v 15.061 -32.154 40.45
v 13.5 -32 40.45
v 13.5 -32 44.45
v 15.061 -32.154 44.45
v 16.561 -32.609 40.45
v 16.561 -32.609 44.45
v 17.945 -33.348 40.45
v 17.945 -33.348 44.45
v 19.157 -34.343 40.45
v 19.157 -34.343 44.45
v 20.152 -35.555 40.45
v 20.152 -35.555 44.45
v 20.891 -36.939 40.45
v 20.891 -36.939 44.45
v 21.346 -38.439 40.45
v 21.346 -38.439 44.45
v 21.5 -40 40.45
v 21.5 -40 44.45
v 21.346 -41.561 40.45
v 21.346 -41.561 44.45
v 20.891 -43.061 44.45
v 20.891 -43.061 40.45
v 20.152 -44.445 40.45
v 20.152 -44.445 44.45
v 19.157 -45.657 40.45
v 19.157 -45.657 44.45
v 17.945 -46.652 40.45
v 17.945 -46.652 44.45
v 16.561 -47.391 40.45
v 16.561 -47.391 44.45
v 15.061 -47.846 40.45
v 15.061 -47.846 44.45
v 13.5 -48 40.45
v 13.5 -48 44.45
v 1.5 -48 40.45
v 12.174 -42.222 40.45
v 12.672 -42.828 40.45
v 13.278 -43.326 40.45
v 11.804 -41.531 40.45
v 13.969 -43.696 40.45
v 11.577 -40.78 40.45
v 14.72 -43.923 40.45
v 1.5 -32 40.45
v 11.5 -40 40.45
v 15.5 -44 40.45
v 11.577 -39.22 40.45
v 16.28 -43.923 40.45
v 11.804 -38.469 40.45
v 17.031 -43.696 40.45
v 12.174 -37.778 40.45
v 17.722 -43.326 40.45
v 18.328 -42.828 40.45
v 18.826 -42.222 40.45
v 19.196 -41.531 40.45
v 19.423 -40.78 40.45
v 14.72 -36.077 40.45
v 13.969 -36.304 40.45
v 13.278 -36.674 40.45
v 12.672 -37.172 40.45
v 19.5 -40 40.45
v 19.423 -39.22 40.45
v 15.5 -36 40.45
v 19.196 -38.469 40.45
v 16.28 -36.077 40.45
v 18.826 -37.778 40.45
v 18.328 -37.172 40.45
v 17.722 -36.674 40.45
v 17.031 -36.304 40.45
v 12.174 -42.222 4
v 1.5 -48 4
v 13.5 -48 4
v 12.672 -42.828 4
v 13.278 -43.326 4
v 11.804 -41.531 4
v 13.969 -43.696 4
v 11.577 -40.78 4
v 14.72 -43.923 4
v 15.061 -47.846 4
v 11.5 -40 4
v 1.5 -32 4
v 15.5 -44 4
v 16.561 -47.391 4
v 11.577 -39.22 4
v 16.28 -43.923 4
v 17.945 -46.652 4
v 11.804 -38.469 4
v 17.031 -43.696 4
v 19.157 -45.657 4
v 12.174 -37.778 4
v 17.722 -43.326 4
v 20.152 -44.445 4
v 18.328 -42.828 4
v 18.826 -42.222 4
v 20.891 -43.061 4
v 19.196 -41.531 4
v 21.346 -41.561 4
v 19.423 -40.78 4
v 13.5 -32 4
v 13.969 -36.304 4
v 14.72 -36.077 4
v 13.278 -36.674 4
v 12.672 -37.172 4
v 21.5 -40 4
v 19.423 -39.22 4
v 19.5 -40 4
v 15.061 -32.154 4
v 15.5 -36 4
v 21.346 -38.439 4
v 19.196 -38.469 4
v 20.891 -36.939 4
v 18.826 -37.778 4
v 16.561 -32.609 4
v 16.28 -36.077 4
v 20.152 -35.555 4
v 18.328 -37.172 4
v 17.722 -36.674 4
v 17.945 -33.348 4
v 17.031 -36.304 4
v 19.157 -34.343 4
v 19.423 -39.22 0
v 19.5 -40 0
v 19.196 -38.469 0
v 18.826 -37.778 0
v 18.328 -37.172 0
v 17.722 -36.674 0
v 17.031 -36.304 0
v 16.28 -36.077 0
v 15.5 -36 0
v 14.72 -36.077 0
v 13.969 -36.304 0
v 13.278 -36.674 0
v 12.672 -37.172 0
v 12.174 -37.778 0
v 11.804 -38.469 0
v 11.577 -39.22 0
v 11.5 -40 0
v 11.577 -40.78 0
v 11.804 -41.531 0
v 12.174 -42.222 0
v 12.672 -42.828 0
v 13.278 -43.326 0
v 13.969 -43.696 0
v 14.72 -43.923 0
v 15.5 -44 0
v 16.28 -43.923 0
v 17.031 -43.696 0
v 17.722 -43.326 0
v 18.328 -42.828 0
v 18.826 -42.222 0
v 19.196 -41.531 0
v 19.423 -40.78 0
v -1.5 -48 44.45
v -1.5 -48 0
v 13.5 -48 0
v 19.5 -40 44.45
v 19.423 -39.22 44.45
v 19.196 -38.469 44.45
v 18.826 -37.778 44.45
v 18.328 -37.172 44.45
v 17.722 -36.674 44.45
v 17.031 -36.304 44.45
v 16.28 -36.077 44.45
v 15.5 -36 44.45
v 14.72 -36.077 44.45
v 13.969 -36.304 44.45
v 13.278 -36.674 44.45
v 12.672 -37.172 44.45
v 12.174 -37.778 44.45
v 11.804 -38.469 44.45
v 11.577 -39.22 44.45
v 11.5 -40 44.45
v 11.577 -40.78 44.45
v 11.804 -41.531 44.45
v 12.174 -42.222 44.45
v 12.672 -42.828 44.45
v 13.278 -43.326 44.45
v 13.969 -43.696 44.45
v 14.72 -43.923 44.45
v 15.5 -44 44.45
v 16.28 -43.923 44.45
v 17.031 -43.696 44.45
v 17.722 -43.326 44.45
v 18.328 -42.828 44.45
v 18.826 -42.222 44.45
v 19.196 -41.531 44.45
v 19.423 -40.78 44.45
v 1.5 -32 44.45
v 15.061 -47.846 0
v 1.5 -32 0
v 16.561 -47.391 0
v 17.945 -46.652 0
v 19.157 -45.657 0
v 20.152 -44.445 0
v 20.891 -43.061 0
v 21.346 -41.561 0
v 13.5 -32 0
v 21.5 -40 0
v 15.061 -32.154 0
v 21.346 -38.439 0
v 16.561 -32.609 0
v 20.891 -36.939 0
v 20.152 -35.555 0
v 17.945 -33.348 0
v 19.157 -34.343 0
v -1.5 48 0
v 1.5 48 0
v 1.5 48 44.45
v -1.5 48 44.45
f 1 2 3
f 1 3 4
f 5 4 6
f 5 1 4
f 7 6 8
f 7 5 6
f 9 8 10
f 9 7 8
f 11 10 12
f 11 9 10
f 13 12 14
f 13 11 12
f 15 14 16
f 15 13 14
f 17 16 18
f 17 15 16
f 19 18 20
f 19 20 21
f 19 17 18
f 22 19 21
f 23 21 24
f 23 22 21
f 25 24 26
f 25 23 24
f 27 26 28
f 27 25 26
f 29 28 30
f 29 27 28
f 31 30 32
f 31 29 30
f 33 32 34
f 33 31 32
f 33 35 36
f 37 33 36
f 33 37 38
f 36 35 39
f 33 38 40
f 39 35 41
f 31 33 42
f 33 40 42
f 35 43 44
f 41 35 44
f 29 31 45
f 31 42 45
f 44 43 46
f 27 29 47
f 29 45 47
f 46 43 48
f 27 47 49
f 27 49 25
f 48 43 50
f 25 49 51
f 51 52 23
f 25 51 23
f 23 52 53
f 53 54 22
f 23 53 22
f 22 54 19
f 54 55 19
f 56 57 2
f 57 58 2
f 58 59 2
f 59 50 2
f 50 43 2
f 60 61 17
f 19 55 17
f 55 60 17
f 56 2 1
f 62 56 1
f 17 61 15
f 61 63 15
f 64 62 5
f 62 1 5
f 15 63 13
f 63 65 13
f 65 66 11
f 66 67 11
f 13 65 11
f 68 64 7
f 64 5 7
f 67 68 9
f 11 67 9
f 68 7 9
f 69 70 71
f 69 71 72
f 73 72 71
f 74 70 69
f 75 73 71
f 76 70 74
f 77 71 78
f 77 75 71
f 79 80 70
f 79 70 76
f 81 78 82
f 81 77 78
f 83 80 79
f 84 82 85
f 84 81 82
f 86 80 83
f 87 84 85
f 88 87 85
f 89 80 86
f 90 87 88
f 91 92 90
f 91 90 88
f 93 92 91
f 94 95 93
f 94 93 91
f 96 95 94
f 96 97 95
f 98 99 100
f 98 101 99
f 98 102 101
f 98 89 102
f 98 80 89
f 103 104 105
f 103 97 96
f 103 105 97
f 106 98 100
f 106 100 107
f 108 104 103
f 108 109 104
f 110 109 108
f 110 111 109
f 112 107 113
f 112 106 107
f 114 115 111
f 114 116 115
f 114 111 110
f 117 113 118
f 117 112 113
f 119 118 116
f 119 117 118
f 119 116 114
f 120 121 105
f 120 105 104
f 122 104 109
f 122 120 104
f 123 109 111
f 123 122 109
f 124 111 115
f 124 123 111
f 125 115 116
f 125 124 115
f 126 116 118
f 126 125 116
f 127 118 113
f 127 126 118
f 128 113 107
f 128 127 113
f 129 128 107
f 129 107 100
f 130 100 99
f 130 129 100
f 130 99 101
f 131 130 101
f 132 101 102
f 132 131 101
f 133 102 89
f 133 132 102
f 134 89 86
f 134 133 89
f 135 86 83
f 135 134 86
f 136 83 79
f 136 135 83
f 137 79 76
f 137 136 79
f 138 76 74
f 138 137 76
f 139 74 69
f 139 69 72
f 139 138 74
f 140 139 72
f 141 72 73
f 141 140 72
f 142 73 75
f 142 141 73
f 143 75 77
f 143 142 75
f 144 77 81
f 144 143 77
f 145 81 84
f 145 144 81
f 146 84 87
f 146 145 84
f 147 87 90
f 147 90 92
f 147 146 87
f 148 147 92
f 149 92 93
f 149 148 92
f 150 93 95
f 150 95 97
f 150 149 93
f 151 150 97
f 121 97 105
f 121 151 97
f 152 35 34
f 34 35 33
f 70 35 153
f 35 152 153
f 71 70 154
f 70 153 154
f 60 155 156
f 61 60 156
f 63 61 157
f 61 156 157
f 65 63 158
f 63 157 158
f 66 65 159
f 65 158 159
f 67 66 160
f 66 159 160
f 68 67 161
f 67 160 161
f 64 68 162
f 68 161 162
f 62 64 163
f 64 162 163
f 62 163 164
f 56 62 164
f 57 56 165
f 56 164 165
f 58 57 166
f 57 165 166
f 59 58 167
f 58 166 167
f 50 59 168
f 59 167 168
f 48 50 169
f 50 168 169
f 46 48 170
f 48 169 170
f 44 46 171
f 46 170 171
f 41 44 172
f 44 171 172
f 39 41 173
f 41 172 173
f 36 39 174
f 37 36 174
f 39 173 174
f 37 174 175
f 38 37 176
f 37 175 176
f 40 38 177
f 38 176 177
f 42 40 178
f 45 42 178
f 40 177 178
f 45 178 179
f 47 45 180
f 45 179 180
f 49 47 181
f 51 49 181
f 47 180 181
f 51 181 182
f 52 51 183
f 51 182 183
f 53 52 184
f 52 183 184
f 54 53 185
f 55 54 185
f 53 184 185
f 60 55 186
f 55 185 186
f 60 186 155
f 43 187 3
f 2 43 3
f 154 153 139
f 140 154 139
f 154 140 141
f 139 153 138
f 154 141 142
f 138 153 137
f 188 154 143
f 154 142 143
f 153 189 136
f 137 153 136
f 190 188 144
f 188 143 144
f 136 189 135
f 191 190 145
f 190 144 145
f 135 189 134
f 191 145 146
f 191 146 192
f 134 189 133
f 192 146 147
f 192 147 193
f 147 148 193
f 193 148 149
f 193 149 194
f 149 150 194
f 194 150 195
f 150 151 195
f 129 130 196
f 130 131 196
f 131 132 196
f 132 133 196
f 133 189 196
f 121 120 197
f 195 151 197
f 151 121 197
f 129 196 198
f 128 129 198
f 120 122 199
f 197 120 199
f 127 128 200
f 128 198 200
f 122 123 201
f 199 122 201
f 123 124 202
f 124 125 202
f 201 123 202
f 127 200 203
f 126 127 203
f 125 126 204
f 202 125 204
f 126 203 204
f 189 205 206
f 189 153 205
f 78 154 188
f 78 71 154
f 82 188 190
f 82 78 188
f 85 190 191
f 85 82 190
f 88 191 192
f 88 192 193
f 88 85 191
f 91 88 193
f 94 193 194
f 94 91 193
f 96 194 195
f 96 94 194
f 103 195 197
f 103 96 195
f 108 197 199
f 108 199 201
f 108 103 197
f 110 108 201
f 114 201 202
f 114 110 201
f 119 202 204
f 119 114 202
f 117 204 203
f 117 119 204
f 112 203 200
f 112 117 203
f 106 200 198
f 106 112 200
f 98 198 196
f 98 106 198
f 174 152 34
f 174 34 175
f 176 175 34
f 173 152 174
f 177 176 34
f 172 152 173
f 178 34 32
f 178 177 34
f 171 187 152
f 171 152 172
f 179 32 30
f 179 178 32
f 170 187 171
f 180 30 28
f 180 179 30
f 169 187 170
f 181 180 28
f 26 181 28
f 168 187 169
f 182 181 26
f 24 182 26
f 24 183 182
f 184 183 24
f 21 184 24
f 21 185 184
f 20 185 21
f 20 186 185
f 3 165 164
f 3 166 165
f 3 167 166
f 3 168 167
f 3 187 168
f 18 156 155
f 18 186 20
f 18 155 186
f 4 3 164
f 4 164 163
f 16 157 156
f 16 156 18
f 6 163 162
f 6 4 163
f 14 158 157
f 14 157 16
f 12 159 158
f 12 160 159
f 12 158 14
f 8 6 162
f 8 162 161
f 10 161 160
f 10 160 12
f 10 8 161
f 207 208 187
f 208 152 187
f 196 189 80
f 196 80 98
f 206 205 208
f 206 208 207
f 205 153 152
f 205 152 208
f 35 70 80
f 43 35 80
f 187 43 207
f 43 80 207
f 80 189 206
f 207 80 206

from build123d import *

# Parameters (mm, degrees)
SKETCH1_W                   = 3
SKETCH1_H                   = 96
BOSS_EXTRUDE1_DEPTH         = 44.45
SKETCH2_W                   = 20
SKETCH2_H                   = 16
SKETCH2_R                   = 4
BOSS_EXTRUDE2_DEPTH         = 4
FILLET2_RADIUS              = 8
FILLET2_LENGTH              = 4
FILLET2_OF_MIRROR2_2_RADIUS = 8
FILLET2_OF_MIRROR2_2_LENGTH = 4


with BuildPart() as part:
    # Sketch1 → Boss-Extrude1 (new body)
    with BuildSketch(Plane.XY):
        Rectangle(SKETCH1_W, SKETCH1_H)
    extrude(amount=BOSS_EXTRUDE1_DEPTH)

    # Sketch2 → Boss-Extrude2 (add)
    with BuildSketch(Plane.XY.offset(44.45)):
        with Locations((11.5, -40)):
            Rectangle(SKETCH2_W, SKETCH2_H)
        with Locations((15.5, -40)):
            Circle(SKETCH2_R, mode=Mode.SUBTRACT)
    boss_extrude2 = extrude(amount=-BOSS_EXTRUDE2_DEPTH)

    # Fillet2: full round fillet: the end face becomes a half cylinder, R = half its width
    fillet2_face = Plane((21.5, -40, 42.45), x_dir=(0, 0, -1), z_dir=(1, 0, 0))  # on the end face: x along it, z out of the body
    fillet2_slab = fillet2_face.offset(-FILLET2_RADIUS / 2) * Box(FILLET2_LENGTH, 2 * FILLET2_RADIUS, FILLET2_RADIUS, mode=Mode.PRIVATE)  # the body's end, R deep
    fillet2_round = Plane((13.5, -40, 42.45), x_dir=(1, 0, 0), z_dir=(0, 0, -1)) * Cylinder(FILLET2_RADIUS, FILLET2_LENGTH, mode=Mode.PRIVATE)  # its axis R under the face
    add(fillet2_slab - fillet2_round, mode=Mode.SUBTRACT)

    # Mirror2: Boss-Extrude2 across plane
    add(boss_extrude2.mirror(Plane.XY.offset(22.225)))

    # Fillet2 of Mirror2 2: full round fillet: the end face becomes a half cylinder, R = half its width
    fillet2_of_mirror2_2_face = Plane((21.5, -40, 2), x_dir=(0, 0, 1), z_dir=(1, 0, 0))  # on the end face: x along it, z out of the body
    fillet2_of_mirror2_2_slab = fillet2_of_mirror2_2_face.offset(-FILLET2_OF_MIRROR2_2_RADIUS / 2) * Box(FILLET2_OF_MIRROR2_2_LENGTH, 2 * FILLET2_OF_MIRROR2_2_RADIUS, FILLET2_OF_MIRROR2_2_RADIUS, mode=Mode.PRIVATE)  # the body's end, R deep
    fillet2_of_mirror2_2_round = Plane((13.5, -40, 2), x_dir=(1, 0, 0), z_dir=(0, 0, 1)) * Cylinder(FILLET2_OF_MIRROR2_2_RADIUS, FILLET2_OF_MIRROR2_2_LENGTH, mode=Mode.PRIVATE)  # its axis R under the face
    add(fillet2_of_mirror2_2_slab - fillet2_of_mirror2_2_round, mode=Mode.SUBTRACT)


solid = part.part
